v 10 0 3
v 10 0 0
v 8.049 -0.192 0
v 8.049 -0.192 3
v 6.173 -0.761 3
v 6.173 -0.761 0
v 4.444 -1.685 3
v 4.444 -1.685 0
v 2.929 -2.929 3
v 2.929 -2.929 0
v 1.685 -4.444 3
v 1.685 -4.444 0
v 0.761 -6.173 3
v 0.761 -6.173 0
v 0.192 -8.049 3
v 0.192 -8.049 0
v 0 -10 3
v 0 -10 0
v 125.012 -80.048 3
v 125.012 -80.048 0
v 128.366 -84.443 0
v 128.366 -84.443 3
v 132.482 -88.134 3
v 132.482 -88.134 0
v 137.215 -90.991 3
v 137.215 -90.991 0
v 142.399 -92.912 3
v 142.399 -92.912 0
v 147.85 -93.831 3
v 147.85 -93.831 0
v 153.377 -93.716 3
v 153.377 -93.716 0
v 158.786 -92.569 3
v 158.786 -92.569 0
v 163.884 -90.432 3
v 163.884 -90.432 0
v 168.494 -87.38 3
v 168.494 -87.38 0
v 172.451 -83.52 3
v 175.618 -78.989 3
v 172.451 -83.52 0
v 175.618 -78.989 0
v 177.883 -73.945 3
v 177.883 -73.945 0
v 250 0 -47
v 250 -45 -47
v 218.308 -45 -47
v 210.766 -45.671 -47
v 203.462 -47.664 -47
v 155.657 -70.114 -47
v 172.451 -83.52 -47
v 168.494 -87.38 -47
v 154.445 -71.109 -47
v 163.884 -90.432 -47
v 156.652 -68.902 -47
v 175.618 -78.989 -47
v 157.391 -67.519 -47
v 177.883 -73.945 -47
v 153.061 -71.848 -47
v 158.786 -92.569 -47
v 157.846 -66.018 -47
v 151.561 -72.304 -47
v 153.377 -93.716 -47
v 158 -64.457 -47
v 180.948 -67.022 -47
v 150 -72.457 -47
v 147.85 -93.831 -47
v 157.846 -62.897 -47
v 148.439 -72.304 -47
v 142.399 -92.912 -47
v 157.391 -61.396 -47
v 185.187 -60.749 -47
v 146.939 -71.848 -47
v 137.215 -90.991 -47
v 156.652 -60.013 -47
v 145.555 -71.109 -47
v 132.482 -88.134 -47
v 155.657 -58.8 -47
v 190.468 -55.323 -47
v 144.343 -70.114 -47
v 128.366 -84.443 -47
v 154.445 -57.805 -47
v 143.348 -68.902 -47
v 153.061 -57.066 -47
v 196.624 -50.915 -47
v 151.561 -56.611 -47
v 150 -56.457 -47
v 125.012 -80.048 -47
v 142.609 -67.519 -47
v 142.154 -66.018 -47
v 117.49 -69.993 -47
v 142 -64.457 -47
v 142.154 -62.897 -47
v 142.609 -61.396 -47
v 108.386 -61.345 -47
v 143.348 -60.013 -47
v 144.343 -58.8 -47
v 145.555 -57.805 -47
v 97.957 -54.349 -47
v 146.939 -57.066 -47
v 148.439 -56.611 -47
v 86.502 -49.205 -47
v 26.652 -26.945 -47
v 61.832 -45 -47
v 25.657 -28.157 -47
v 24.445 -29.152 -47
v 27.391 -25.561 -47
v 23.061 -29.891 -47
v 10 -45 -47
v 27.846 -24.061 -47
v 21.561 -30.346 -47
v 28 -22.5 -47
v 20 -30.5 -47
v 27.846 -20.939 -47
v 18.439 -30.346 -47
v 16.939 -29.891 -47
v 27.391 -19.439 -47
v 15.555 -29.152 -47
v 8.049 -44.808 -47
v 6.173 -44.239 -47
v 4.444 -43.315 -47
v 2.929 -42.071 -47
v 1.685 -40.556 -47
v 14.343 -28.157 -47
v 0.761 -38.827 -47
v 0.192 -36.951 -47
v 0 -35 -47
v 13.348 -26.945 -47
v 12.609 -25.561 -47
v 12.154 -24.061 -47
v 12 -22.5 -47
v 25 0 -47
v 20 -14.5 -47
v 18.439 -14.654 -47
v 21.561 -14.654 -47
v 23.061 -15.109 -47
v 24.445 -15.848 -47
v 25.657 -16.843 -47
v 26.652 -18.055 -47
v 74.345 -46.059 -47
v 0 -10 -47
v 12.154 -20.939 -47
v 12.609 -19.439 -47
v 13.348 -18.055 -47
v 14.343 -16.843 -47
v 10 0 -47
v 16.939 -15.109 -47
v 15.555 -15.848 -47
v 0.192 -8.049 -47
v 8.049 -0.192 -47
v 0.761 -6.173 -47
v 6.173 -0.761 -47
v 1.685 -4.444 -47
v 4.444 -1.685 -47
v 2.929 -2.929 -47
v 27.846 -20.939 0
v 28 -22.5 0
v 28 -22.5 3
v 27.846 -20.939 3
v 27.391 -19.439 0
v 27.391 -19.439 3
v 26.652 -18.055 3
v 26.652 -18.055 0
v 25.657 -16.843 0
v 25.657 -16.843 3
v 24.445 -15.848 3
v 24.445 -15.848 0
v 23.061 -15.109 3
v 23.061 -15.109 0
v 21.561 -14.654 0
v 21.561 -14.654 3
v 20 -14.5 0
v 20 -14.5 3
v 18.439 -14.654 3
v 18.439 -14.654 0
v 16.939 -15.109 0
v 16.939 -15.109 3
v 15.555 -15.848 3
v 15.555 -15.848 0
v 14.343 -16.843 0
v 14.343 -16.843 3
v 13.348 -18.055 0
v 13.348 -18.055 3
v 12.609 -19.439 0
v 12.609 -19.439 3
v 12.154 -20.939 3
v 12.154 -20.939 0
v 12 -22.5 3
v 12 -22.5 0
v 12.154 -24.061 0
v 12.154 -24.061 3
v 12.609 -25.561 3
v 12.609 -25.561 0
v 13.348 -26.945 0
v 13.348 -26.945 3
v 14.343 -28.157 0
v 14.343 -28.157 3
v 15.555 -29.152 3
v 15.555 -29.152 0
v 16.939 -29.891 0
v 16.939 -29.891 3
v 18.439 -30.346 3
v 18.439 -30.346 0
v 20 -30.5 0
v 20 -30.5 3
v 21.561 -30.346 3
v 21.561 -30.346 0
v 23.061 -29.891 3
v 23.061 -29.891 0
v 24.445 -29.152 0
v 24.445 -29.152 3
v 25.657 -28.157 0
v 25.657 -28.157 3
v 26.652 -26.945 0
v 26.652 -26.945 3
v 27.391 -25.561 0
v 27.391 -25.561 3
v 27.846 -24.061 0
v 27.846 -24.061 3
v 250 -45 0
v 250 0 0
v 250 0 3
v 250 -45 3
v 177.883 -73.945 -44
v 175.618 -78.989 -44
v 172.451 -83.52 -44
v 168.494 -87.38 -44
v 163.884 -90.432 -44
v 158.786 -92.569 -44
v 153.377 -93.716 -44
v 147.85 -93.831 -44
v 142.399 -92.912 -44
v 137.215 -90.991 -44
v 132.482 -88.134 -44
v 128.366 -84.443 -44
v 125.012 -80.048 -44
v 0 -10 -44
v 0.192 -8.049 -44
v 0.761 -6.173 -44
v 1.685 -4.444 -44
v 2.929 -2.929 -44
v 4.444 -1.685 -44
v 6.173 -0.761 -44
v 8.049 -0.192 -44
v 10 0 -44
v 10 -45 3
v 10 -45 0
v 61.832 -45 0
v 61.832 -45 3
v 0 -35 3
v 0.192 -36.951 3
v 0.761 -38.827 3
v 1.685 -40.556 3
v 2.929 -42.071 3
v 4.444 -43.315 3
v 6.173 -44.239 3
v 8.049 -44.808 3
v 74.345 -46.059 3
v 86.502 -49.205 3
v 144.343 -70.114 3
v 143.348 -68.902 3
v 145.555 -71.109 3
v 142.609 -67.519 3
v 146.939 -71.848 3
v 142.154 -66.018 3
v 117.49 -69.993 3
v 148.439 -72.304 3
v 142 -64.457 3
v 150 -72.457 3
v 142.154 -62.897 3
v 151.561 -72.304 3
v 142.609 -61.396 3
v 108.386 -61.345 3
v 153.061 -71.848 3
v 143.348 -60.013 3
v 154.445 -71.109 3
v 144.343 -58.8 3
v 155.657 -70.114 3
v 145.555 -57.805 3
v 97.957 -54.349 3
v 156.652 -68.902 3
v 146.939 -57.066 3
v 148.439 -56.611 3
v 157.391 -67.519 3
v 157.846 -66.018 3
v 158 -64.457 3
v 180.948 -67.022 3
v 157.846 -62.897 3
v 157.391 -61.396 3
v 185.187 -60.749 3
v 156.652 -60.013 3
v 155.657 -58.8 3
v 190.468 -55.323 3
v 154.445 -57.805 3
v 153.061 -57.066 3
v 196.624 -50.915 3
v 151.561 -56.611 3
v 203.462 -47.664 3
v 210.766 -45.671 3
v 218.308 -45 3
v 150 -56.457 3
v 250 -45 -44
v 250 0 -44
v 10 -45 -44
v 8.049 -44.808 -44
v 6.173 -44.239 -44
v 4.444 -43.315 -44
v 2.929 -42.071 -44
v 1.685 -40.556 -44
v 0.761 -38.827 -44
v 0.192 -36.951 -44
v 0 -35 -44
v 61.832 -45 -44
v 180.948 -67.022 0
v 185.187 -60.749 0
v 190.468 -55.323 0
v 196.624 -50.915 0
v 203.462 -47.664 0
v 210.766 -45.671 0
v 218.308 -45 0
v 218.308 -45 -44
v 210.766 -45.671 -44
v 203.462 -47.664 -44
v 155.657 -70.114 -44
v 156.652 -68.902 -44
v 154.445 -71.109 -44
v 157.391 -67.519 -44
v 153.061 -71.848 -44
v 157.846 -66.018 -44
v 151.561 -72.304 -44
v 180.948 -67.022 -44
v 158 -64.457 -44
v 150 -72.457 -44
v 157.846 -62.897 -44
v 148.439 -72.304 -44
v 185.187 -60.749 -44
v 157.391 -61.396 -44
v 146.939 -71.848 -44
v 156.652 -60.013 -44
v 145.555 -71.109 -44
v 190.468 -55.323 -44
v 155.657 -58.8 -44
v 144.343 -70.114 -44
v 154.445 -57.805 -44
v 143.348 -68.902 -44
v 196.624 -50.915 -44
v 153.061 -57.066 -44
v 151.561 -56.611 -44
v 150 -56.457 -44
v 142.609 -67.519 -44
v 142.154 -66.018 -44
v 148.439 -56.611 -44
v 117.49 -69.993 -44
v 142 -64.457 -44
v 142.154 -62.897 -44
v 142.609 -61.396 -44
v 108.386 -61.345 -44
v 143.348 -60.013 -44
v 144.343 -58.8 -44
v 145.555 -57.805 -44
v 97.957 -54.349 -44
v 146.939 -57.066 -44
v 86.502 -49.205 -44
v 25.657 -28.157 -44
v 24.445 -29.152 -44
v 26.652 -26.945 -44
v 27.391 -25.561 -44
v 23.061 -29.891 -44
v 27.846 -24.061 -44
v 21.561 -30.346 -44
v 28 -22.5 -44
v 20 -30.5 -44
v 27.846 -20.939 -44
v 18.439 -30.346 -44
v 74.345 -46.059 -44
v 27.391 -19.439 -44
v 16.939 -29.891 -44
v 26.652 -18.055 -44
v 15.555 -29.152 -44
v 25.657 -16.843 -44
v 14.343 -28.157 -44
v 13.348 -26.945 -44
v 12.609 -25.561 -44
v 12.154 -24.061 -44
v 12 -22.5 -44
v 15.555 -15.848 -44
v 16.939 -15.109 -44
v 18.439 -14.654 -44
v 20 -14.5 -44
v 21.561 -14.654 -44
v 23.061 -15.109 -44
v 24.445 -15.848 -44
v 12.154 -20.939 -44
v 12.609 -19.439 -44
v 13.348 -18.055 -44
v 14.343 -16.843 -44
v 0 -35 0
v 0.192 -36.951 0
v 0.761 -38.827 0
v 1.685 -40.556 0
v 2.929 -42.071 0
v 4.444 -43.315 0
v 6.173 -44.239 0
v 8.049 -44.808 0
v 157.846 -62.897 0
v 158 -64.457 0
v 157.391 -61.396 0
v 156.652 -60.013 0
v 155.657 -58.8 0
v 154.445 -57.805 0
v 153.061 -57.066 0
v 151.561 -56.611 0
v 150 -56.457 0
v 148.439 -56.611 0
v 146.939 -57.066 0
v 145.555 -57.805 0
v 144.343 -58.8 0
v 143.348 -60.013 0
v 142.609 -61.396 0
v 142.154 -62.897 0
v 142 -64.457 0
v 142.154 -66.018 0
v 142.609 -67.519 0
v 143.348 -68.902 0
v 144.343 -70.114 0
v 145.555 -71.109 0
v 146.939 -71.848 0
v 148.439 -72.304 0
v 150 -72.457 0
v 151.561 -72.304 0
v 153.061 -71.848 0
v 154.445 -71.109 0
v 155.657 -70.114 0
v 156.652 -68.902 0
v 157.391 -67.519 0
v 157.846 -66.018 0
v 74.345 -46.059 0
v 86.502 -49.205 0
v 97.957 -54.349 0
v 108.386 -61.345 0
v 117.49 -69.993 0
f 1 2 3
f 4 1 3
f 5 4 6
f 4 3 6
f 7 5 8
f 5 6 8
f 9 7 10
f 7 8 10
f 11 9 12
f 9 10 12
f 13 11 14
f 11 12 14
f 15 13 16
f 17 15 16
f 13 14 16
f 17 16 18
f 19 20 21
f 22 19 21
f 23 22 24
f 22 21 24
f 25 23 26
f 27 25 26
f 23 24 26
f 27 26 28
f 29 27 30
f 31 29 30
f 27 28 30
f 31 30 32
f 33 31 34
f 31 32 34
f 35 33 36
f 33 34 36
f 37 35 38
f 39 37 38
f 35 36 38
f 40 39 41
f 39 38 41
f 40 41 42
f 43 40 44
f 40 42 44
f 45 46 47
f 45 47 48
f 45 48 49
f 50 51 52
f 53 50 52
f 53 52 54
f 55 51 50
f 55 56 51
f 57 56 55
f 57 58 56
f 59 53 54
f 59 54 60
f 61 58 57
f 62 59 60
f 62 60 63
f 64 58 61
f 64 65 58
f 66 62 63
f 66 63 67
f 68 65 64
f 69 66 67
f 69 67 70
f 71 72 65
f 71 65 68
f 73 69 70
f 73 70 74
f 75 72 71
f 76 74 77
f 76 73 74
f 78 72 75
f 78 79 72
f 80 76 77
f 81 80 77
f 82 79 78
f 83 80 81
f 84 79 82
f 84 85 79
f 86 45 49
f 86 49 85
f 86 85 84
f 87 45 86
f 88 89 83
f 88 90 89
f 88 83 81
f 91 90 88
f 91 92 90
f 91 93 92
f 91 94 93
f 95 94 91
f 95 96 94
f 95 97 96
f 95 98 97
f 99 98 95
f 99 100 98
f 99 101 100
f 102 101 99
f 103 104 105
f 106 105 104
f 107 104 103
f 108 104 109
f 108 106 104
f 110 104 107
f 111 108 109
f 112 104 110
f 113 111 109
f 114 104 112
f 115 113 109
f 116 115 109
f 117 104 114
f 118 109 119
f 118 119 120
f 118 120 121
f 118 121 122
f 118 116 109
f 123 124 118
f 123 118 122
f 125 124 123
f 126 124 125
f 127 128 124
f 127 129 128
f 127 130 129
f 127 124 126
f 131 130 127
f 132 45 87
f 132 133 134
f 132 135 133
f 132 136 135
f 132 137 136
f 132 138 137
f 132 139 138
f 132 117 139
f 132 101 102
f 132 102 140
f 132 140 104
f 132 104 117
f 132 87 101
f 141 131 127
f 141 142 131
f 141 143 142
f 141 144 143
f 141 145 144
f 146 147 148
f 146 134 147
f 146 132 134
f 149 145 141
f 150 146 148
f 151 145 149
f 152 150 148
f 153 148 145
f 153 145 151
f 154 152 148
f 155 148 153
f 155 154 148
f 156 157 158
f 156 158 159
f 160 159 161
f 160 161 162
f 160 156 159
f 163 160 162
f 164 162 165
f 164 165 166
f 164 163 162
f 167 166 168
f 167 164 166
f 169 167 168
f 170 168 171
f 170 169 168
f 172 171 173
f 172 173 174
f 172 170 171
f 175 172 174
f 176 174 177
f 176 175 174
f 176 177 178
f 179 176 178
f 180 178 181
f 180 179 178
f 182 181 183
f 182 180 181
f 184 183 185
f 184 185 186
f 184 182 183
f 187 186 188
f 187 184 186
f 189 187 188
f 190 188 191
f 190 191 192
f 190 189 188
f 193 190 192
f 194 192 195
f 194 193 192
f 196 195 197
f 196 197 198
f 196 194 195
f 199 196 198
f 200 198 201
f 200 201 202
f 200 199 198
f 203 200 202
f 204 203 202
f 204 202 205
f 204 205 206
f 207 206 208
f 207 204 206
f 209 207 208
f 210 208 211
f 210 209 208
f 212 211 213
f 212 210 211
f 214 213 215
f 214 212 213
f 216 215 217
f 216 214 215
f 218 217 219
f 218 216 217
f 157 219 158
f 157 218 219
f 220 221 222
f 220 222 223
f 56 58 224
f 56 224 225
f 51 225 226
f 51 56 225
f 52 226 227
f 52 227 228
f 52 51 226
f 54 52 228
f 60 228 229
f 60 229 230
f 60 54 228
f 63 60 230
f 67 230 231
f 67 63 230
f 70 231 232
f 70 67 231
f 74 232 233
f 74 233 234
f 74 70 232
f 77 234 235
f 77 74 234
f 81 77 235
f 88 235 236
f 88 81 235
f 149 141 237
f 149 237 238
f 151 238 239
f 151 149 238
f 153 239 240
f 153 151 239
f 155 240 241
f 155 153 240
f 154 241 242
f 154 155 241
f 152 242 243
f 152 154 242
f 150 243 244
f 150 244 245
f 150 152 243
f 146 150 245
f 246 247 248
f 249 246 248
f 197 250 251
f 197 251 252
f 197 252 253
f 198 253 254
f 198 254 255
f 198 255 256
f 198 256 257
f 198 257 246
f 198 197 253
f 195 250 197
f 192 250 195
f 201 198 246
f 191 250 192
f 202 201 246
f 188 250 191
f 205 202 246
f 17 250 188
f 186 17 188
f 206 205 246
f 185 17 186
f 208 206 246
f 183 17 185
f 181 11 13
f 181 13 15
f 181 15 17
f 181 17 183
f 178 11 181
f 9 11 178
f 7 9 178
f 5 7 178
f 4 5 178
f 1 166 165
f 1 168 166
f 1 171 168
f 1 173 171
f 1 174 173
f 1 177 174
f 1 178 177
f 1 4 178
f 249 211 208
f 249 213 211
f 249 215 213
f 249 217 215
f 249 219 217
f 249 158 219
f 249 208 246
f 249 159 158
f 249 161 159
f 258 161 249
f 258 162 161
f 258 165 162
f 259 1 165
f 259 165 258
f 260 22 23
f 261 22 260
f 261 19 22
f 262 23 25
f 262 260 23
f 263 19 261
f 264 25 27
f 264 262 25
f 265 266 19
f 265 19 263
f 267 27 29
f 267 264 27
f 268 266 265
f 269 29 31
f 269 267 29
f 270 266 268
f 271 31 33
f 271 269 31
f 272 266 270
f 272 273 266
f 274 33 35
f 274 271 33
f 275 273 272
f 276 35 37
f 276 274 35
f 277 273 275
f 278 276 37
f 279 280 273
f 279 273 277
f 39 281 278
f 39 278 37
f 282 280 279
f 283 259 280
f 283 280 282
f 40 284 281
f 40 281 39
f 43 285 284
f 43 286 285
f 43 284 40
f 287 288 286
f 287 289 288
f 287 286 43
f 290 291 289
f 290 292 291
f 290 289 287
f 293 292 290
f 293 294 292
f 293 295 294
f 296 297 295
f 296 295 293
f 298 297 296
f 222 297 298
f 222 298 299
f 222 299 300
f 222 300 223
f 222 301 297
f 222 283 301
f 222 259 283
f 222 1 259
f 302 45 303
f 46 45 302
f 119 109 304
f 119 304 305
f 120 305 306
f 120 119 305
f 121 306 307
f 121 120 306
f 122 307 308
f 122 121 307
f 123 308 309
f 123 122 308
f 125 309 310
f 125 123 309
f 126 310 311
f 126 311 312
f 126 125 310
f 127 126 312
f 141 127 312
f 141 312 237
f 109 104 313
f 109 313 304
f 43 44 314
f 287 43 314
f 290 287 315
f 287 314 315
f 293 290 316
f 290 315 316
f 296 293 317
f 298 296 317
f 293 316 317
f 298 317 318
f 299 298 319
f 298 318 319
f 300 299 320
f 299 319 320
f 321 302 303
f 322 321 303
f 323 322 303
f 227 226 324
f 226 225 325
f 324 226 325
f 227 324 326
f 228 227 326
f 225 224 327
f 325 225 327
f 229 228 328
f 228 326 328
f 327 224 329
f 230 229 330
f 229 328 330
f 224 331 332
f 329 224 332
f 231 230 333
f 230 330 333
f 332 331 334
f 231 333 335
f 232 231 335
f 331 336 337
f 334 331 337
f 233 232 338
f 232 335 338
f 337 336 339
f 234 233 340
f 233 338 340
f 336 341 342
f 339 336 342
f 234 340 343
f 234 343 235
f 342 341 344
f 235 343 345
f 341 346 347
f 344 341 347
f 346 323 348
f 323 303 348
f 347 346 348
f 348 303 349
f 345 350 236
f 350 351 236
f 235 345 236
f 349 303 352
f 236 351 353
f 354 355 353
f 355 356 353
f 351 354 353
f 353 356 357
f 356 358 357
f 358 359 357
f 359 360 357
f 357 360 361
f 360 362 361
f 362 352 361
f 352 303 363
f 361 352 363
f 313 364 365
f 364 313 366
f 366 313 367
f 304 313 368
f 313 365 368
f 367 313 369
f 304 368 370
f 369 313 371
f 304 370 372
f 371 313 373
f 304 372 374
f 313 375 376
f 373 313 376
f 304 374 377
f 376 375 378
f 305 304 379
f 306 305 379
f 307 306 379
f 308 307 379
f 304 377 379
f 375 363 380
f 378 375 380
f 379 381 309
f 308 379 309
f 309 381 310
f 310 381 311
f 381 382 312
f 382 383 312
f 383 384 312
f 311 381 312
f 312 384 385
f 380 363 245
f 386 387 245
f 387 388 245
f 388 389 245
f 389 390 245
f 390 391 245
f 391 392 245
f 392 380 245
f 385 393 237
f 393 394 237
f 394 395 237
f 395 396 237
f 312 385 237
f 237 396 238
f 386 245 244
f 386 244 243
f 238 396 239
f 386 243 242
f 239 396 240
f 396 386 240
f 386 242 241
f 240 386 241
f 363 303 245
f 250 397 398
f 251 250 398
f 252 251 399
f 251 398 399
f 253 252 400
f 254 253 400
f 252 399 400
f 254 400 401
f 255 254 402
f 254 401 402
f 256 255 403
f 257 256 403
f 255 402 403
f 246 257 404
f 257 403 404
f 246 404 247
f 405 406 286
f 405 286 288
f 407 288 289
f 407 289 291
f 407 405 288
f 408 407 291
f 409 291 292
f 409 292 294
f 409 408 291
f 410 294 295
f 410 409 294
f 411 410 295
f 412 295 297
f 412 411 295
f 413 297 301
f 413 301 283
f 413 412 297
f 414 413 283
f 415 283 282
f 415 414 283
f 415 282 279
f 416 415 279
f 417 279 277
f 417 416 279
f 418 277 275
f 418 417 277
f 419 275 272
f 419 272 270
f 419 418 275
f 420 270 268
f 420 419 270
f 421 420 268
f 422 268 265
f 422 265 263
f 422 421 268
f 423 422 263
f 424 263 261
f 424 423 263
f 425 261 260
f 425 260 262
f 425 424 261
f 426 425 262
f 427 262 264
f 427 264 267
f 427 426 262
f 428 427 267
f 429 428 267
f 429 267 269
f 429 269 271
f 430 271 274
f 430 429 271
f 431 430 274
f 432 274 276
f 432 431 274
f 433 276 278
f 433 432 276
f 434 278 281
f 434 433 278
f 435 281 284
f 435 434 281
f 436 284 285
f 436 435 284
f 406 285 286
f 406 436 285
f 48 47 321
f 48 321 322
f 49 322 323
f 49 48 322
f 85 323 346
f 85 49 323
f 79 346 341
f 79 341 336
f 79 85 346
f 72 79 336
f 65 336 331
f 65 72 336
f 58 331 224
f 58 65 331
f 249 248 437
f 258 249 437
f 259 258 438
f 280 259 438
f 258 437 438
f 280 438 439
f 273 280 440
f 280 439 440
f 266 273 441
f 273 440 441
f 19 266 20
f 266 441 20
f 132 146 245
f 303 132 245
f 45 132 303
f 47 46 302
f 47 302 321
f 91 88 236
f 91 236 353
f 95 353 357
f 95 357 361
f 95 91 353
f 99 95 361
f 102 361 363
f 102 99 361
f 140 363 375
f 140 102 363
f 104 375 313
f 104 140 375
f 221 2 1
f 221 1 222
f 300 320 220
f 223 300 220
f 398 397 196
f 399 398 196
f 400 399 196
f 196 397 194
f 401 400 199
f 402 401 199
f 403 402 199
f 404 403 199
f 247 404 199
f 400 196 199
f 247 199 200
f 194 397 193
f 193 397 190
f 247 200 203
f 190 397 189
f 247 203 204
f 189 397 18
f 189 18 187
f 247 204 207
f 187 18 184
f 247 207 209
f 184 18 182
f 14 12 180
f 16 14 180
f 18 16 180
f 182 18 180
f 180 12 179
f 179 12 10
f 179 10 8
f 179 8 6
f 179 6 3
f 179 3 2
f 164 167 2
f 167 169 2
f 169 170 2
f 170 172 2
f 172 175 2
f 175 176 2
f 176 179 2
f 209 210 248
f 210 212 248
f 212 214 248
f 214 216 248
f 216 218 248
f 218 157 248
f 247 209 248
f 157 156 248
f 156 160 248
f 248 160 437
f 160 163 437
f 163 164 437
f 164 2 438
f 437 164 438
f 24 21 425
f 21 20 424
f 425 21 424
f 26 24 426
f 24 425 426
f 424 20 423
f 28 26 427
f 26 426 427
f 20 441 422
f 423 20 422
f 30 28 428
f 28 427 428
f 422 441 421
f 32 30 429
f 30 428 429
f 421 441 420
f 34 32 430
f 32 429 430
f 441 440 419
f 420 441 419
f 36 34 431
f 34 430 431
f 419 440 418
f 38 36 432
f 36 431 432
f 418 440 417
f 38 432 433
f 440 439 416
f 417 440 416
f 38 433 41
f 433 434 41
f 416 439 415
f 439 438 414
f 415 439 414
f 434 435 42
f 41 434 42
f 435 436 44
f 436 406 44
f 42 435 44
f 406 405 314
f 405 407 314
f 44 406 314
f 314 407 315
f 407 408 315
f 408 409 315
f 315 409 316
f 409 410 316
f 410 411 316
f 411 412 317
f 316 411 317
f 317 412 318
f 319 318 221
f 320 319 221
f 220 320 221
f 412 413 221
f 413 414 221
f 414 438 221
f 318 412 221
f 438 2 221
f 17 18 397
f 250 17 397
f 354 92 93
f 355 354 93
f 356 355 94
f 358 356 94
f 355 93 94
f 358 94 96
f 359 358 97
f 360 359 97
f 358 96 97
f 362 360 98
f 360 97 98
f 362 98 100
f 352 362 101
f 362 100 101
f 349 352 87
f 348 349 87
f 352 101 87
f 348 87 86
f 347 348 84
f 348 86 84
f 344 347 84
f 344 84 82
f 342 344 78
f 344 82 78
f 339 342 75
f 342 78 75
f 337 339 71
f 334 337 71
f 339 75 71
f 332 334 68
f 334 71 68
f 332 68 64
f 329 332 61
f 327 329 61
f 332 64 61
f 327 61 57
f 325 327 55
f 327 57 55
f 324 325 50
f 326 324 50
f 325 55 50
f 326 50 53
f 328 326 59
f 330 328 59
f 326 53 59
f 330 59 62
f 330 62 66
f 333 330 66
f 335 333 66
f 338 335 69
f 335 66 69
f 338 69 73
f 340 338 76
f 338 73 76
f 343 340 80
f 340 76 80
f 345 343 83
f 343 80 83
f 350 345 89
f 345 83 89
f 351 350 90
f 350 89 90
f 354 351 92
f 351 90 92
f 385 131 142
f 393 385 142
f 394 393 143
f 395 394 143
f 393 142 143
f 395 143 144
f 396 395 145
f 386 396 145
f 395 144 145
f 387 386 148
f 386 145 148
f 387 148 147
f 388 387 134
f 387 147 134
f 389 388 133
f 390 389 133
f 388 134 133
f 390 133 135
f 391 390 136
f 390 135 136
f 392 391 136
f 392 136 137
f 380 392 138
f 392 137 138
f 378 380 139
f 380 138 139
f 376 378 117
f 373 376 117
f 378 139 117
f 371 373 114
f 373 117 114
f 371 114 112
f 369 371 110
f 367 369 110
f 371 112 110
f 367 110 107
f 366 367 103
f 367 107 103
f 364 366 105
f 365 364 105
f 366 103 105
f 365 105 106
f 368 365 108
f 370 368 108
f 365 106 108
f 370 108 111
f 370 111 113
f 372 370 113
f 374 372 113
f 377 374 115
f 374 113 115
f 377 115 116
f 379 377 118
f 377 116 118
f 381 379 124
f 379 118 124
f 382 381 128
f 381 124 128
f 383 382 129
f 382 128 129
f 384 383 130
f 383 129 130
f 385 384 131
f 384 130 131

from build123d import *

# Parameters (mm, degrees)
SKETCH1_R           = 8
BOSS_EXTRUDE1_DEPTH = 3
SKETCH2_W           = 225
SKETCH2_H           = 3
BOSS_EXTRUDE2_DEPTH = 50
SKETCH3_R           = 8
BOSS_EXTRUDE3_DEPTH = 3
SKETCH4_R           = 2
CUT_EXTRUDE1_DEPTH  = 3
SKETCH5_W           = 225
SKETCH5_H           = 50.324774777
CUT_EXTRUDE2_DEPTH  = 3


with BuildPart() as part:
    # Sketch1 → Boss-Extrude1 (new body)
    with BuildSketch(Plane.XY):
        with BuildLine():
            Line((0, -10), (0, -35))
            ThreePointArc((0, -35), (2.928932188, -42.071067812), (10, -45))
            Line((10, -45), (61.832258709, -45))
            ThreePointArc((61.832258709, -45), (97.957481274, -54.348936041), (125.012434489, -80.04842664))
            ThreePointArc((125.012434489, -80.04842664), (153.377377511, -93.715687165), (177.882550256, -73.945494662))
            ThreePointArc((177.882550256, -73.945494662), (193.448136306, -52.982472122), (218.308062331, -45))
            Line((218.308062331, -45), (250, -45))
            Line((250, -45), (250, 0))
            Line((250, 0), (10, 0))
            ThreePointArc((10, 0), (2.928932188, -2.928932188), (0, -10))
        make_face()
        with Locations((20, -22.5)):
            Circle(SKETCH1_R, mode=Mode.SUBTRACT)
        with Locations((150, -64.457235549)):
            Circle(SKETCH1_R, mode=Mode.SUBTRACT)
    extrude(amount=BOSS_EXTRUDE1_DEPTH)

    # Sketch2 → Boss-Extrude2 (add)
    with BuildSketch(Plane.XY.offset(3)):
        with Locations((137.5, 1.5)):
            Rectangle(SKETCH2_W, SKETCH2_H)
    extrude(amount=-BOSS_EXTRUDE2_DEPTH)

    # Sketch3 → Boss-Extrude3 (add)
    with BuildSketch(Plane(origin=(0, 0, -47), x_dir=(-1, 0, 0), z_dir=(0, 0, -1))):
        with BuildLine():
            Line((-61.832258709, -45), (-10, -45))
            ThreePointArc((-10, -45), (-2.928932188, -42.071067812), (0, -35))
            Line((0, -35), (0, -10))
            ThreePointArc((0, -10), (-2.928932188, -2.928932188), (-10, 0))
            Line((-10, 0), (-25, 0))
            Line((-25, 0), (-250, 0))
            Line((-250, 0), (-250, -45))
            Line((-250, -45), (-218.308062331, -45))
            ThreePointArc((-218.308062331, -45), (-193.448136306, -52.982472122), (-177.882550256, -73.945494662))
            ThreePointArc((-177.882550256, -73.945494662), (-153.377377511, -93.715687165), (-125.012434489, -80.04842664))
            ThreePointArc((-125.012434489, -80.04842664), (-97.957481274, -54.348936041), (-61.832258709, -45))
        make_face()
        with Locations((-20, -22.5)):
            Circle(SKETCH3_R, mode=Mode.SUBTRACT)
        with Locations((-150, -64.457235549)):
            Circle(SKETCH3_R, mode=Mode.SUBTRACT)
    extrude(amount=-BOSS_EXTRUDE3_DEPTH)

    # Sketch4 → Cut-Extrude1 (cut)
    with BuildSketch(Plane(origin=(0, 3, 0), x_dir=(1, 0, 0), z_dir=(0, 1, 0))):
        with Locations((130, 34)):
            Circle(SKETCH4_R)
        with Locations((130, 10)):
            Circle(SKETCH4_R)
        with Locations((143, 34)):
            Circle(SKETCH4_R)
        with Locations((143, 10)):
            Circle(SKETCH4_R)
        with Locations((156, 34)):
            Circle(SKETCH4_R)
        with Locations((156, 10)):
            Circle(SKETCH4_R)
    extrude(amount=-CUT_EXTRUDE1_DEPTH, mode=Mode.SUBTRACT)

    # Sketch5 → Cut-Extrude2 (cut)
    with BuildSketch(Plane(origin=(0, 3, 0), x_dir=(1, 0, 0), z_dir=(0, 1, 0))):
        with Locations((137.5, 21.837612611)):
            Rectangle(SKETCH5_W, SKETCH5_H)
    extrude(amount=-CUT_EXTRUDE2_DEPTH, mode=Mode.SUBTRACT)


solid = part.part
